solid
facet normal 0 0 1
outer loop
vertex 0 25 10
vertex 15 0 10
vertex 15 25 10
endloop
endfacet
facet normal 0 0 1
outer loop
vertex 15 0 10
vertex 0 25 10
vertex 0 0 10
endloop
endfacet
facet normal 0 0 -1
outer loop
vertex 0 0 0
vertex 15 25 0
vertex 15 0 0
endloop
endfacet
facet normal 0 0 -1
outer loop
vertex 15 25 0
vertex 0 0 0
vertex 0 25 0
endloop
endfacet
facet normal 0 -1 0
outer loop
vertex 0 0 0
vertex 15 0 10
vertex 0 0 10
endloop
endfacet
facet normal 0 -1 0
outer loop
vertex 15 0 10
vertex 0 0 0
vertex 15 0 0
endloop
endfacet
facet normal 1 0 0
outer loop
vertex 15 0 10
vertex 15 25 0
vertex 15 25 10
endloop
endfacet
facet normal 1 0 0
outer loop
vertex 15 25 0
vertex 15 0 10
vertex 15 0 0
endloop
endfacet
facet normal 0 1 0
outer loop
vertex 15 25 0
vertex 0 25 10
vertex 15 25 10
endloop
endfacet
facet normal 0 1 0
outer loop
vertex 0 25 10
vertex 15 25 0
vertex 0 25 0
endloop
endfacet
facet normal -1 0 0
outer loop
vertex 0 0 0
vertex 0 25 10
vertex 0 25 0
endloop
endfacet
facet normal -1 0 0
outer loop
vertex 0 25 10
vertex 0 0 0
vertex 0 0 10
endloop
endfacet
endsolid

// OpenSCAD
// Generated by generate_scads.py
cube(size=[15,25,10], center=false);
